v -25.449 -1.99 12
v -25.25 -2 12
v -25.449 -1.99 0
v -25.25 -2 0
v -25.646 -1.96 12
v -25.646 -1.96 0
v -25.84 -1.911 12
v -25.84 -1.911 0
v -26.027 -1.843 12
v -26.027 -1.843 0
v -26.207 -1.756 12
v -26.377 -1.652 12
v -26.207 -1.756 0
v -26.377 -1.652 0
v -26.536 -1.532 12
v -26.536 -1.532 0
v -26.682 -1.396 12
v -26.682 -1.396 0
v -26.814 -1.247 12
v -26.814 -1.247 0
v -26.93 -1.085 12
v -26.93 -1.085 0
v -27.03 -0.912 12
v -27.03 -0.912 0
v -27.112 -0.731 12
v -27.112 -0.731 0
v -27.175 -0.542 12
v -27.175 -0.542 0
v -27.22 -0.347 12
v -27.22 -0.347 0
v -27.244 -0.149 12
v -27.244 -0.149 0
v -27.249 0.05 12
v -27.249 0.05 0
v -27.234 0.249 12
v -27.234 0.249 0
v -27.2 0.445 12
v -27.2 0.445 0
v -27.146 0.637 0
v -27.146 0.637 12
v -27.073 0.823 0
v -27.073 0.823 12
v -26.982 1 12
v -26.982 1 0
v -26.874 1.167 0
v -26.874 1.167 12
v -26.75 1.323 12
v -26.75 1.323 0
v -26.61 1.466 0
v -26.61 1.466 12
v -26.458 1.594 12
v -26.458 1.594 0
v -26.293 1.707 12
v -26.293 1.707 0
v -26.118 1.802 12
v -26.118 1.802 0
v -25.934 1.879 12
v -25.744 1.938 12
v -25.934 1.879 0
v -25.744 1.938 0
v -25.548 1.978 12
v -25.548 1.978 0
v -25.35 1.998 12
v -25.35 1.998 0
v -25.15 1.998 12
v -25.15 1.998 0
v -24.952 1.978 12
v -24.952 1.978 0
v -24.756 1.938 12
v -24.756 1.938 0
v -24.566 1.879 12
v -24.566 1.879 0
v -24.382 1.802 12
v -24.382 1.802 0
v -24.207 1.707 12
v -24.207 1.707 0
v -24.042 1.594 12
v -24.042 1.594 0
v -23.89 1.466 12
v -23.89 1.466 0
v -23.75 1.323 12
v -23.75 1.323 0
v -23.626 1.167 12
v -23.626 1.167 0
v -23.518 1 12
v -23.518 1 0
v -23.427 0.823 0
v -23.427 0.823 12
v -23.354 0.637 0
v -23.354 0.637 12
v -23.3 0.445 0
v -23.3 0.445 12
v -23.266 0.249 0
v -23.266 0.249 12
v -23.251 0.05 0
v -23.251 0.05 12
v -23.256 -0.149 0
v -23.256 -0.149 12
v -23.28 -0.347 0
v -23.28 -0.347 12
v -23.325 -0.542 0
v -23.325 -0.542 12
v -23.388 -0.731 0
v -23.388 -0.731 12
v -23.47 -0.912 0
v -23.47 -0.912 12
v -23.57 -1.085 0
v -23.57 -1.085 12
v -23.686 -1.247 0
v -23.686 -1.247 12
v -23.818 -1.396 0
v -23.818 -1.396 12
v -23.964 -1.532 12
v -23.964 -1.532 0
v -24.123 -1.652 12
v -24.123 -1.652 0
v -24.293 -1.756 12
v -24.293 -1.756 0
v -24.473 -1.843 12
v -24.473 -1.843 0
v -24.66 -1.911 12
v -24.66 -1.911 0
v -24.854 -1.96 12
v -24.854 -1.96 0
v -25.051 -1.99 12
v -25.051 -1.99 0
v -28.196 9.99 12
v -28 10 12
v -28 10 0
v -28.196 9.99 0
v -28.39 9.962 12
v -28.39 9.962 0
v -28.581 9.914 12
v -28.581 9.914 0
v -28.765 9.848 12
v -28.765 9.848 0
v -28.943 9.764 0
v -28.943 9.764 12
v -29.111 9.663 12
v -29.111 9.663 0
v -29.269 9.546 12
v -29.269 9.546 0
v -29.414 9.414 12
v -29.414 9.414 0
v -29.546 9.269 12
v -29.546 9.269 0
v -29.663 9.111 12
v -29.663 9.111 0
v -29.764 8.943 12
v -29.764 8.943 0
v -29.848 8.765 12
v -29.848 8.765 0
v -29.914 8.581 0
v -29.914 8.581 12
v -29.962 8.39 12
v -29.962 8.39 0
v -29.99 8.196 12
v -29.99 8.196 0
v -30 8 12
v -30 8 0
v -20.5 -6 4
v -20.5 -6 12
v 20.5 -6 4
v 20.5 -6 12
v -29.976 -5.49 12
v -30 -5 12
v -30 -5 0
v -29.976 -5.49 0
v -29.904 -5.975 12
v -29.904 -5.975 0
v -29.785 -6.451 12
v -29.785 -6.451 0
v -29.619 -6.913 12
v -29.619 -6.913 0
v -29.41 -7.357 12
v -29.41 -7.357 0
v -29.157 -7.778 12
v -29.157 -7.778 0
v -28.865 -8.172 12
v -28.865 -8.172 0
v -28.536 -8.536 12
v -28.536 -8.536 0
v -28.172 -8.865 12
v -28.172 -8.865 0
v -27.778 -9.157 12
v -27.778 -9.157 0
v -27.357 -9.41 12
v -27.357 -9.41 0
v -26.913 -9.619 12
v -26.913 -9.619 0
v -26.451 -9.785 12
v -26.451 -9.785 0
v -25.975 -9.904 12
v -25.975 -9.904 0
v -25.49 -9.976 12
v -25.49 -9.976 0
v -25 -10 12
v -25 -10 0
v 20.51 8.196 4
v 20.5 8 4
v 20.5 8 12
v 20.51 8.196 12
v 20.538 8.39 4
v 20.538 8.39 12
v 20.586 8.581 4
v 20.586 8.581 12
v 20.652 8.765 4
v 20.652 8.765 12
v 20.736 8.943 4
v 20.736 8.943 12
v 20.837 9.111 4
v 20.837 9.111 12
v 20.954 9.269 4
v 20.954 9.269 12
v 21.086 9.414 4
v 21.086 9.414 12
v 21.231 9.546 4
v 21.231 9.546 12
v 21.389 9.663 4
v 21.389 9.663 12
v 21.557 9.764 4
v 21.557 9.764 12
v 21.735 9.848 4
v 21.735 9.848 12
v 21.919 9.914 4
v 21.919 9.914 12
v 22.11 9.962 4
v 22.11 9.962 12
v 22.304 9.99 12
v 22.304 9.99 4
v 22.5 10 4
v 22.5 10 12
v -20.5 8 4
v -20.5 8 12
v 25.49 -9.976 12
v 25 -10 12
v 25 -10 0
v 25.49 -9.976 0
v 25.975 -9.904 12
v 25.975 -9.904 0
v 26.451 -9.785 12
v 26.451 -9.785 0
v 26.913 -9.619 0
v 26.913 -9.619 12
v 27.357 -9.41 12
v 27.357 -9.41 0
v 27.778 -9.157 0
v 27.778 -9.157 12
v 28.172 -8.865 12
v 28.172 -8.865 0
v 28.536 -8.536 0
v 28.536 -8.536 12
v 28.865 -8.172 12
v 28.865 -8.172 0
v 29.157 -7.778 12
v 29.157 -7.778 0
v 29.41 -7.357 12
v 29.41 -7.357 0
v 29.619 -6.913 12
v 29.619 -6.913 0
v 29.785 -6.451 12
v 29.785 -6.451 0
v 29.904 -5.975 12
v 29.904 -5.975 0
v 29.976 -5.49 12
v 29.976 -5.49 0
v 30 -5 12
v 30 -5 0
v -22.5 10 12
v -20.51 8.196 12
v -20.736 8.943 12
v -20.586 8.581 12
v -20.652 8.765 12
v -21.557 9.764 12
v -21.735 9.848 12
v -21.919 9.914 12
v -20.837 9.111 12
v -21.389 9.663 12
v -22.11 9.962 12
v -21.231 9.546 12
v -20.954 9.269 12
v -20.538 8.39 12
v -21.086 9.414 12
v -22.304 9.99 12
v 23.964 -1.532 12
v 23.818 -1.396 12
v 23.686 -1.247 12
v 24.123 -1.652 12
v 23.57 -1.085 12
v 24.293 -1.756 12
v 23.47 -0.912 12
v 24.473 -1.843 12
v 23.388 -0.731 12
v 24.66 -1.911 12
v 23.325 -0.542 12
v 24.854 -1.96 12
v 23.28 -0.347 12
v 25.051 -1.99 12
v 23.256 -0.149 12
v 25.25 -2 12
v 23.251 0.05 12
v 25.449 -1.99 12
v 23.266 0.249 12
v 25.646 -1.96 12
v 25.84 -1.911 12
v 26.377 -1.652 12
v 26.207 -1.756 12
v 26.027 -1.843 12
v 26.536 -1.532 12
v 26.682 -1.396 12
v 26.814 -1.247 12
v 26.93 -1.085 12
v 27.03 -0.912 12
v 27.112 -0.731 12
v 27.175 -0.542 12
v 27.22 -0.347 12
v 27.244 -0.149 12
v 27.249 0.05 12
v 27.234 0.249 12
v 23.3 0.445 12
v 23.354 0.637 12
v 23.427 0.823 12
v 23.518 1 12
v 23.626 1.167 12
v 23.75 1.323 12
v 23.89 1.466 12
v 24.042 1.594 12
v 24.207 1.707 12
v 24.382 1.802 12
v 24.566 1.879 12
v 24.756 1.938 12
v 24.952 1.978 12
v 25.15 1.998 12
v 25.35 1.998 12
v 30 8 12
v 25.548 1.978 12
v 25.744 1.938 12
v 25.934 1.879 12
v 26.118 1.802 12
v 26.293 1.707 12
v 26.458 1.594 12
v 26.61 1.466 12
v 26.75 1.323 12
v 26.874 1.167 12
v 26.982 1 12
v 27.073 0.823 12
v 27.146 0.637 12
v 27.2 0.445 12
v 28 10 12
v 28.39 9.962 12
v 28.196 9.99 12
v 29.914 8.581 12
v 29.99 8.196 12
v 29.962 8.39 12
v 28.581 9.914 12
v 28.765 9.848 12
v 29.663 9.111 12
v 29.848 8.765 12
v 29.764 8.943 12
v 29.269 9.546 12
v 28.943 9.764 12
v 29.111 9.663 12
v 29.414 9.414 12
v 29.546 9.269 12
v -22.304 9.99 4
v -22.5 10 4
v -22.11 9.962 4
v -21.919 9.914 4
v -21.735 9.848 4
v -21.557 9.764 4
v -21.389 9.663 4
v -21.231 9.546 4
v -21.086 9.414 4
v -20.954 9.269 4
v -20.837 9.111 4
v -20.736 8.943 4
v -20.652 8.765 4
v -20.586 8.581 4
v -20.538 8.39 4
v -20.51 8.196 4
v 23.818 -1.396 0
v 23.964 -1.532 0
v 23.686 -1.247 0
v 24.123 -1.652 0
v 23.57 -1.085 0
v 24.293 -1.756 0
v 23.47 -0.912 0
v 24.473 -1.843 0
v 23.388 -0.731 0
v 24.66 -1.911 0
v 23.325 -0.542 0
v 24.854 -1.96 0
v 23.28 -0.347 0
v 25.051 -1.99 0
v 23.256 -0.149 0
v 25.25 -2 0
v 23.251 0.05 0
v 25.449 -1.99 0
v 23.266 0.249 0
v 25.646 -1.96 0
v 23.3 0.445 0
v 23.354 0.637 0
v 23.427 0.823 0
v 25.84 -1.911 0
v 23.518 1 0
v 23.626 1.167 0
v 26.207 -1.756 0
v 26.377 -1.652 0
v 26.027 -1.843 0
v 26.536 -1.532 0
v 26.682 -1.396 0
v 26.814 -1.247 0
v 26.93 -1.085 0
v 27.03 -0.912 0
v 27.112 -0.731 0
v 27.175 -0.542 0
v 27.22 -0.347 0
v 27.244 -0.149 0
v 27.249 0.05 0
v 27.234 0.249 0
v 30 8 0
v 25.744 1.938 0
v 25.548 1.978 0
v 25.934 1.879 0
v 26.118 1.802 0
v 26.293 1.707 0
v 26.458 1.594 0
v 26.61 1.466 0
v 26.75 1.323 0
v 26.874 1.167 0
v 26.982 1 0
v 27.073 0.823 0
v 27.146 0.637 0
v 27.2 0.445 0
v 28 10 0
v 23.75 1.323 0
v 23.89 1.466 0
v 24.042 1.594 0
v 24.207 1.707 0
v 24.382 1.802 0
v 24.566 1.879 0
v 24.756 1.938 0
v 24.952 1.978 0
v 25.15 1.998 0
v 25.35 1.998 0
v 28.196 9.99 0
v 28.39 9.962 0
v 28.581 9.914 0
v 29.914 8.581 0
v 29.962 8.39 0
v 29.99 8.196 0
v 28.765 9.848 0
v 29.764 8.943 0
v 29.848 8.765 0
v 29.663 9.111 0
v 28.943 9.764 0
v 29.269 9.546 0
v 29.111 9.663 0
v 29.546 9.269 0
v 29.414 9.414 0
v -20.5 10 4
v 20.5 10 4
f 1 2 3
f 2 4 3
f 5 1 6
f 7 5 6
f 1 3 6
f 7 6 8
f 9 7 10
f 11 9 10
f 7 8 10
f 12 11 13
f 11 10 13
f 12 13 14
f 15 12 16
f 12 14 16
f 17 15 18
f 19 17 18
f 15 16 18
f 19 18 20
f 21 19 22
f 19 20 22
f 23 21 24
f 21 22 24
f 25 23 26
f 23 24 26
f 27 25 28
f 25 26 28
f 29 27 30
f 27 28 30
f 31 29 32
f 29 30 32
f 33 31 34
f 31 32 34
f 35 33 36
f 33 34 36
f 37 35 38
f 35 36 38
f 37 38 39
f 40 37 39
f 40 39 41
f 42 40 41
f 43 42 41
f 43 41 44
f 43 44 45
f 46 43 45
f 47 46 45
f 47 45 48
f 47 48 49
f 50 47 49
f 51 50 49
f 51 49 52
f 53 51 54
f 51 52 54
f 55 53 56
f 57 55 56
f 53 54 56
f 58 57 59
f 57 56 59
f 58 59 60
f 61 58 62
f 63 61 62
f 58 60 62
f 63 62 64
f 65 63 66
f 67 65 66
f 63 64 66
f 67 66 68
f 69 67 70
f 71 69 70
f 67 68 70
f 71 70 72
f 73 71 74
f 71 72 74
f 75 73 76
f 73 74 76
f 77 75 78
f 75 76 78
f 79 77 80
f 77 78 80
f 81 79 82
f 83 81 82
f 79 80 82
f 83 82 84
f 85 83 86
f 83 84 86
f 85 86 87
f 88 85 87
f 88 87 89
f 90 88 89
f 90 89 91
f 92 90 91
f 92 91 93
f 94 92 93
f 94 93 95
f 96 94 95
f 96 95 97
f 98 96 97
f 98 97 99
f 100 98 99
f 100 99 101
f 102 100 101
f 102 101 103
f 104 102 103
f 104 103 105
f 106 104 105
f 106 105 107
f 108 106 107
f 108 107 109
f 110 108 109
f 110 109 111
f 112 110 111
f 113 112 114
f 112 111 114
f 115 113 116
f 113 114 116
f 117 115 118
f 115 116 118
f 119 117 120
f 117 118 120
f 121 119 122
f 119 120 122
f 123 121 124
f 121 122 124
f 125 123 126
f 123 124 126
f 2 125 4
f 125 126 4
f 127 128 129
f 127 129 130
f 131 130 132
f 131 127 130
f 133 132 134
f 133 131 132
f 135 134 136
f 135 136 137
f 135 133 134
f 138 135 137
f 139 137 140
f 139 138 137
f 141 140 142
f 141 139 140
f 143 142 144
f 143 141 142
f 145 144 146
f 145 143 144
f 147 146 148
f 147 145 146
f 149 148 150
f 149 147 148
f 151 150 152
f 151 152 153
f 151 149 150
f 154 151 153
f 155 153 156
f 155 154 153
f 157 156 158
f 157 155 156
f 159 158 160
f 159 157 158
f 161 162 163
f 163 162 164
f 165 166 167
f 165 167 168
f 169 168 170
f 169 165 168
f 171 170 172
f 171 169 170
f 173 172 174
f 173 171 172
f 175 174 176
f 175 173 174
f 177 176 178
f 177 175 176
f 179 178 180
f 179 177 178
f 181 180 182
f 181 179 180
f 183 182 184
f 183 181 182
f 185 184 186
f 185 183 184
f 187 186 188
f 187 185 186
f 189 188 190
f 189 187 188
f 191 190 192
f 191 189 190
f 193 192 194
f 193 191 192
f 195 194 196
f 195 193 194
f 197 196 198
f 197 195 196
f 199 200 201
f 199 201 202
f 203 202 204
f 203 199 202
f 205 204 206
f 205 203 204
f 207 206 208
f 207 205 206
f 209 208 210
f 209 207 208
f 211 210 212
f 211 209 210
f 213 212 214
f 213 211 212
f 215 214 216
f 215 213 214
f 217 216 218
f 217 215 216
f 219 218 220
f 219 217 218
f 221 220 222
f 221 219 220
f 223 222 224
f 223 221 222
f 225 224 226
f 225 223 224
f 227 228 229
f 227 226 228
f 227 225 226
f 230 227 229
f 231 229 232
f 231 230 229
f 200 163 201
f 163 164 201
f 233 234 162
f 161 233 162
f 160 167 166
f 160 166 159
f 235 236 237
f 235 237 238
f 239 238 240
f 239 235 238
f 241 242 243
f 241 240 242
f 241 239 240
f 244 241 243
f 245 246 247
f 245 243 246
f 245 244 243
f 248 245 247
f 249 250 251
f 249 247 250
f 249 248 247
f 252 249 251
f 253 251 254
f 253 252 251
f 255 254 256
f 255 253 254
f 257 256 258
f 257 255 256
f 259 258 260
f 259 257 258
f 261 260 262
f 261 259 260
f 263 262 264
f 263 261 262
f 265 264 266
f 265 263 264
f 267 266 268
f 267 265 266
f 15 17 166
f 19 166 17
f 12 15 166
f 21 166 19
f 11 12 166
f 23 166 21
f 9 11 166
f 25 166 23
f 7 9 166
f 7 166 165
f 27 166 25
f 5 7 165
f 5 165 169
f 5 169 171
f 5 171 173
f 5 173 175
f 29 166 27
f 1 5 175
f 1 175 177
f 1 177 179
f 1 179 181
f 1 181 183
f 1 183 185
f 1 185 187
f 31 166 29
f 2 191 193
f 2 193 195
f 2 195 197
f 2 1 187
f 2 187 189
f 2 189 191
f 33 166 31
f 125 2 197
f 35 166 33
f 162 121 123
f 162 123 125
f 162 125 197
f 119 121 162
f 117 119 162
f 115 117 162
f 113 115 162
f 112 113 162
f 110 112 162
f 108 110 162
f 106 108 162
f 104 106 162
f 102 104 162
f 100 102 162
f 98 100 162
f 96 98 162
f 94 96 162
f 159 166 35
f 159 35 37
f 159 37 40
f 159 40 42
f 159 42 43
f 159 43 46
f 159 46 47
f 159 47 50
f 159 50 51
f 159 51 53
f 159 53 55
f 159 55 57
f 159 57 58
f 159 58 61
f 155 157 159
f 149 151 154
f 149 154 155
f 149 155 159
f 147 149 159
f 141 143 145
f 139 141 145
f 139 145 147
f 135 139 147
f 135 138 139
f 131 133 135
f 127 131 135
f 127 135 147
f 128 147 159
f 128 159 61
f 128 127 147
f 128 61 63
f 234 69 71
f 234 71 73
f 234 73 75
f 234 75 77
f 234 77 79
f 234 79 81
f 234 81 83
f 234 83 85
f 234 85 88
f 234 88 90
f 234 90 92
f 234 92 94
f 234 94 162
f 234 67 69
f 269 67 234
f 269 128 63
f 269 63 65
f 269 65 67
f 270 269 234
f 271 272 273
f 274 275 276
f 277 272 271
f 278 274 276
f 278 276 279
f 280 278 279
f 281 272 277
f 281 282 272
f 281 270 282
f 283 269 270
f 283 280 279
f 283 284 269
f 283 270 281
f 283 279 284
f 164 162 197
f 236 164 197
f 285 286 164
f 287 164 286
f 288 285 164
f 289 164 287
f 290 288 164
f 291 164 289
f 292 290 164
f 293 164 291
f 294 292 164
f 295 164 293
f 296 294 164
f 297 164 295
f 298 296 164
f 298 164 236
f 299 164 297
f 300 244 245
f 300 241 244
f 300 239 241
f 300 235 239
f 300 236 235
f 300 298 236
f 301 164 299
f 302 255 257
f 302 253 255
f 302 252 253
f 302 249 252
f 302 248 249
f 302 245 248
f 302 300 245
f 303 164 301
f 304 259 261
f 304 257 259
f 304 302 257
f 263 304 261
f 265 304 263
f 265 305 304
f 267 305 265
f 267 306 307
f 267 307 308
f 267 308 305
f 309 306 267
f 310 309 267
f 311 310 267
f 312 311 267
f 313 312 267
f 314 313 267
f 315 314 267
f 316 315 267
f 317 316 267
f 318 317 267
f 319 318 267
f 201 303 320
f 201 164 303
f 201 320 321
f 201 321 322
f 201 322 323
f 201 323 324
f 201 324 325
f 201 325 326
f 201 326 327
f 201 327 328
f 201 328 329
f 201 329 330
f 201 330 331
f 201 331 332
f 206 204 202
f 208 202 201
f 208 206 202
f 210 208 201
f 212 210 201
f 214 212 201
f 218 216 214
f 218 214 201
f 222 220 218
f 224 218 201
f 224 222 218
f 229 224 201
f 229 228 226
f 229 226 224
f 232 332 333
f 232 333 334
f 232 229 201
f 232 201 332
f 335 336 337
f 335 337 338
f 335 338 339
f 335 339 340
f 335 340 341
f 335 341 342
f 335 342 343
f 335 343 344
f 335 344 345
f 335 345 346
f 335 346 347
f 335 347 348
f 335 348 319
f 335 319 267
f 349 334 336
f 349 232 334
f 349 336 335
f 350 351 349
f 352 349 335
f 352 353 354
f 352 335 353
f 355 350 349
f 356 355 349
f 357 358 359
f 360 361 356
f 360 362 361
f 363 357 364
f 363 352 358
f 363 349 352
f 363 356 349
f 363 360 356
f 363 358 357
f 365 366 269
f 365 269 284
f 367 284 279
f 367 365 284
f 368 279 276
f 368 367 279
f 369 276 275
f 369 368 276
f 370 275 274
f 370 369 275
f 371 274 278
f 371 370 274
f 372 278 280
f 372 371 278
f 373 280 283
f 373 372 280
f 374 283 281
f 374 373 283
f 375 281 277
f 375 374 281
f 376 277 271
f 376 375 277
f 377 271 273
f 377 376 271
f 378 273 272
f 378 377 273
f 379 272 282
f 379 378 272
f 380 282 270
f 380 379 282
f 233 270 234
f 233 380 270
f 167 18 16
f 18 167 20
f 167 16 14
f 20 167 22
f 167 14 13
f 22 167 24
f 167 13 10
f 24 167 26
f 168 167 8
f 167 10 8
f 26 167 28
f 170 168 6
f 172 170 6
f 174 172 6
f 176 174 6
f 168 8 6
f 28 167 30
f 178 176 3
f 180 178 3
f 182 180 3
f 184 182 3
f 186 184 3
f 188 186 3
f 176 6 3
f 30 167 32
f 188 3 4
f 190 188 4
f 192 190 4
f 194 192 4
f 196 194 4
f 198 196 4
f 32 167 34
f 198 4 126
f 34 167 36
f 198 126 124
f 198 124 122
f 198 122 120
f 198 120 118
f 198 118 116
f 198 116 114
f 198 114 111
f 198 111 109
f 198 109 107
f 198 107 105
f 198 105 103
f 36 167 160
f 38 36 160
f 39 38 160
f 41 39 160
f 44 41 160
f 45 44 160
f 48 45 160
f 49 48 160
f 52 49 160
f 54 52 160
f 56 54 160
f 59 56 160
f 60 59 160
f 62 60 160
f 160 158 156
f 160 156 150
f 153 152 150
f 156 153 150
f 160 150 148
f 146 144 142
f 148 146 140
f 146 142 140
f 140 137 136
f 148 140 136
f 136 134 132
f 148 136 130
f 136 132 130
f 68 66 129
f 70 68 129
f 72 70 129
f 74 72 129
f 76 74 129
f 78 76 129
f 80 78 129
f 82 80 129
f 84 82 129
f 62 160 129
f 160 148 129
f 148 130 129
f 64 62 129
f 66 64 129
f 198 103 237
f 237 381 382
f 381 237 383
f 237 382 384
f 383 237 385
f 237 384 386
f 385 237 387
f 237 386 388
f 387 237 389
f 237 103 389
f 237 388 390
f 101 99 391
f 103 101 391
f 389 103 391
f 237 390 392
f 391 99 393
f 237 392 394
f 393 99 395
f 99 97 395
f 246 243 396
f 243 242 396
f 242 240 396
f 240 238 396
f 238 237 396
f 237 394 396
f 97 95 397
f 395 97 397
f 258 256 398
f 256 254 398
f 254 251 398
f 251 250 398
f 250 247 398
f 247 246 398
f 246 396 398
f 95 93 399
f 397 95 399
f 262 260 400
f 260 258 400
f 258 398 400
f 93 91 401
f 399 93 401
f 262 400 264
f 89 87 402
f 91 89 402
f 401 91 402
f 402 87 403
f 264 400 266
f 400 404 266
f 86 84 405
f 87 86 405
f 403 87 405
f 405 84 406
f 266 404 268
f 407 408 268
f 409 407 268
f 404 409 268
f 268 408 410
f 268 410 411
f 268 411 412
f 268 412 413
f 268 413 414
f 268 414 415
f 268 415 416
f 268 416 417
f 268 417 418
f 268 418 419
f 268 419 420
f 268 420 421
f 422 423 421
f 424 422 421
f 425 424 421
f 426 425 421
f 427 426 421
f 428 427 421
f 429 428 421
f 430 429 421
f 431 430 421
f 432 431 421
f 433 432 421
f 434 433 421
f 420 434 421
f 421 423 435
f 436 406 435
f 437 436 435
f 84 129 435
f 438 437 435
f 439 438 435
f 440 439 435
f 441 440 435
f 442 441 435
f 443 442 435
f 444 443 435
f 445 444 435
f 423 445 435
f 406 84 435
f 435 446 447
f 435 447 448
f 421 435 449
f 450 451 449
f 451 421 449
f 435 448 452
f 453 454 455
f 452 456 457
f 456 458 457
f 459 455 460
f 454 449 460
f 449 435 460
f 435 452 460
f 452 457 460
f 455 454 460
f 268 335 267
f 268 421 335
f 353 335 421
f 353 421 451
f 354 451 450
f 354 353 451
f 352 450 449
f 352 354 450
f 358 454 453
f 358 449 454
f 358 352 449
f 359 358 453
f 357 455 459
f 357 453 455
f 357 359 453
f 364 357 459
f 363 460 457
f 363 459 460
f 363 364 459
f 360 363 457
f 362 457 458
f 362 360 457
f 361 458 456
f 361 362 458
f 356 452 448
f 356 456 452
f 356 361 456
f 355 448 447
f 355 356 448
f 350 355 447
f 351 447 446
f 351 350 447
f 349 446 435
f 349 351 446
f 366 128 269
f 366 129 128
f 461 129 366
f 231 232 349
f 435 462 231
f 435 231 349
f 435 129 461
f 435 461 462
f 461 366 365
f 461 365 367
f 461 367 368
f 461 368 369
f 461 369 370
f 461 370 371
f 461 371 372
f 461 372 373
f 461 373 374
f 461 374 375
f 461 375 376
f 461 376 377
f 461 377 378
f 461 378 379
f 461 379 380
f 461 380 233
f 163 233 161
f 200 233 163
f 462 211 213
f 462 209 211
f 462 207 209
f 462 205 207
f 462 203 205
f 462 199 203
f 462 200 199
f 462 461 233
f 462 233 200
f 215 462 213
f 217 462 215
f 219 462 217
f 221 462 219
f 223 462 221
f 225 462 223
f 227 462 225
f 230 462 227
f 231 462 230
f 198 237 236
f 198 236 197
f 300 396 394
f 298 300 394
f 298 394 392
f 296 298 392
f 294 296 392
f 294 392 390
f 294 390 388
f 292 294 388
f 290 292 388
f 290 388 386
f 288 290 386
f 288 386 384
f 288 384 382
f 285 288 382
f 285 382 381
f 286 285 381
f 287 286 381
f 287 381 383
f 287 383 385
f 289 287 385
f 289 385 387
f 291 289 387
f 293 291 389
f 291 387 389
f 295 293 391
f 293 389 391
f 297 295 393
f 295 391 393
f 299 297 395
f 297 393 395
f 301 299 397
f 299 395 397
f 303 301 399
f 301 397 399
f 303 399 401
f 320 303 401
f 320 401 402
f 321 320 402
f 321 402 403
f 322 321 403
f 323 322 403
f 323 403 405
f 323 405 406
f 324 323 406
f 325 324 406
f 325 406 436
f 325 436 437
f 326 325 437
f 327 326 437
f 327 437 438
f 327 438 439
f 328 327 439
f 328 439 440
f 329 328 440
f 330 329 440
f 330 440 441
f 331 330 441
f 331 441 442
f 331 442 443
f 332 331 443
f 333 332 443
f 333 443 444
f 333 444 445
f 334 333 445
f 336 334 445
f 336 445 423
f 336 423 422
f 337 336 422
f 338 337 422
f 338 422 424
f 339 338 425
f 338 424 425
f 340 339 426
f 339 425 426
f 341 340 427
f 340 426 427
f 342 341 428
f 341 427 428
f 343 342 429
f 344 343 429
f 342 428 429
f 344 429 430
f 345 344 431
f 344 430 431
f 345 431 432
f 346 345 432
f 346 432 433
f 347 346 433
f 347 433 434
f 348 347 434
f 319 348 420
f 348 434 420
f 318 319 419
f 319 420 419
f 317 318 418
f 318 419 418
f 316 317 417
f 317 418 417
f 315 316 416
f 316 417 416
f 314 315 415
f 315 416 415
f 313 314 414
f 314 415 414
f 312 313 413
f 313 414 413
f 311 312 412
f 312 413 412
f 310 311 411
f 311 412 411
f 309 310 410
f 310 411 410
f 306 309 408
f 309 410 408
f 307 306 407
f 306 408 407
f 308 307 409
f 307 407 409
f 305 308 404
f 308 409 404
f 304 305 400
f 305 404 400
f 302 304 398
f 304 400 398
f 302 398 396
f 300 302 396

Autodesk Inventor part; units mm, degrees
ref_plane "YZ Plane" through (0, 0, 0) normal (1, 0, 0) x (0, 1, 0)
ref_plane "XZ Plane" through (0, 0, 0) normal (0, 1, 0) x (-1, 0, 0)
ref_plane "XY Plane" through (0, 0, 0) normal (0, 0, 1) x (1, 0, 0)
sketch "Sketch1" plane through (0, 0, 0) normal (0, 0, 1) x (1, 0, 0)
  line L0 (-30, 10) -> (30, 10)
  line L1 (30, 10) -> (30, -10)
  line L2 (30, -10) -> (-30, -10)
  line L3 (-30, -10) -> (-30, 10)
  line L4 (-30, 10) -> (30, -10) construction
  line L5 (30, 10) -> (-30, -10) construction
  point P0 (0, 0)
  dimension "d0" = 60
  dimension "d1" = 20
extrude "Extrusion1" add sketch "Sketch1" along normal blind 12
sketch "Sketch2" plane through (0, 0, 12) normal (0, 0, 1) x (1, 0, 0)
  line L0 (-20.5, -6) -> (20.5, -6)
  line L1 (20.5, -6) -> (20.5, 10)
  line L2 (20.5, 10) -> (-20.5, 10)
  line L3 (-20.5, 10) -> (-20.5, -6)
  line L4 (30, 10) -> (-30, 10) projected
  line L5 (-30, -10) -> (30, -10) projected
  point P0 (0, 0)
  point P1 (0, 10)
  dimension "d4" = 41
  dimension "d5" = 4
extrude "Extrusion2" cut sketch "Sketch2" against normal blind 8
sketch "Sketch3" plane through (0, 0, 12) normal (0, 0, 1) x (1, 0, 0)
  line L0 (-25.25, 0) -> (25.25, 0) construction
  line L1 (-30, 10) -> (-30, -10) projected
  line L2 (-20.5, -6) -> (-20.5, 10) projected
  point P0 (0, 0)
  point P1 (0, 0)
  dimension "d8" = 9.5
  dimension "d9" = 4.75
hole "Hole1" at (-25.25, 0, 12) at (25.25, 0, 12) direction (0, 0, -1) diameter 4 end through all
fillet "Fillet1" radius 2 4 edges at (-30, 10, 6) (-20.5, 10, 8) (20.5, 10, 8) (30, 10, 6)
fillet "Fillet2" radius 5 2 edges at (30, -10, 6) (-30, -10, 6)
equation "\"d9\" = 0.5 * d8"
properties part number "Battery Support"
